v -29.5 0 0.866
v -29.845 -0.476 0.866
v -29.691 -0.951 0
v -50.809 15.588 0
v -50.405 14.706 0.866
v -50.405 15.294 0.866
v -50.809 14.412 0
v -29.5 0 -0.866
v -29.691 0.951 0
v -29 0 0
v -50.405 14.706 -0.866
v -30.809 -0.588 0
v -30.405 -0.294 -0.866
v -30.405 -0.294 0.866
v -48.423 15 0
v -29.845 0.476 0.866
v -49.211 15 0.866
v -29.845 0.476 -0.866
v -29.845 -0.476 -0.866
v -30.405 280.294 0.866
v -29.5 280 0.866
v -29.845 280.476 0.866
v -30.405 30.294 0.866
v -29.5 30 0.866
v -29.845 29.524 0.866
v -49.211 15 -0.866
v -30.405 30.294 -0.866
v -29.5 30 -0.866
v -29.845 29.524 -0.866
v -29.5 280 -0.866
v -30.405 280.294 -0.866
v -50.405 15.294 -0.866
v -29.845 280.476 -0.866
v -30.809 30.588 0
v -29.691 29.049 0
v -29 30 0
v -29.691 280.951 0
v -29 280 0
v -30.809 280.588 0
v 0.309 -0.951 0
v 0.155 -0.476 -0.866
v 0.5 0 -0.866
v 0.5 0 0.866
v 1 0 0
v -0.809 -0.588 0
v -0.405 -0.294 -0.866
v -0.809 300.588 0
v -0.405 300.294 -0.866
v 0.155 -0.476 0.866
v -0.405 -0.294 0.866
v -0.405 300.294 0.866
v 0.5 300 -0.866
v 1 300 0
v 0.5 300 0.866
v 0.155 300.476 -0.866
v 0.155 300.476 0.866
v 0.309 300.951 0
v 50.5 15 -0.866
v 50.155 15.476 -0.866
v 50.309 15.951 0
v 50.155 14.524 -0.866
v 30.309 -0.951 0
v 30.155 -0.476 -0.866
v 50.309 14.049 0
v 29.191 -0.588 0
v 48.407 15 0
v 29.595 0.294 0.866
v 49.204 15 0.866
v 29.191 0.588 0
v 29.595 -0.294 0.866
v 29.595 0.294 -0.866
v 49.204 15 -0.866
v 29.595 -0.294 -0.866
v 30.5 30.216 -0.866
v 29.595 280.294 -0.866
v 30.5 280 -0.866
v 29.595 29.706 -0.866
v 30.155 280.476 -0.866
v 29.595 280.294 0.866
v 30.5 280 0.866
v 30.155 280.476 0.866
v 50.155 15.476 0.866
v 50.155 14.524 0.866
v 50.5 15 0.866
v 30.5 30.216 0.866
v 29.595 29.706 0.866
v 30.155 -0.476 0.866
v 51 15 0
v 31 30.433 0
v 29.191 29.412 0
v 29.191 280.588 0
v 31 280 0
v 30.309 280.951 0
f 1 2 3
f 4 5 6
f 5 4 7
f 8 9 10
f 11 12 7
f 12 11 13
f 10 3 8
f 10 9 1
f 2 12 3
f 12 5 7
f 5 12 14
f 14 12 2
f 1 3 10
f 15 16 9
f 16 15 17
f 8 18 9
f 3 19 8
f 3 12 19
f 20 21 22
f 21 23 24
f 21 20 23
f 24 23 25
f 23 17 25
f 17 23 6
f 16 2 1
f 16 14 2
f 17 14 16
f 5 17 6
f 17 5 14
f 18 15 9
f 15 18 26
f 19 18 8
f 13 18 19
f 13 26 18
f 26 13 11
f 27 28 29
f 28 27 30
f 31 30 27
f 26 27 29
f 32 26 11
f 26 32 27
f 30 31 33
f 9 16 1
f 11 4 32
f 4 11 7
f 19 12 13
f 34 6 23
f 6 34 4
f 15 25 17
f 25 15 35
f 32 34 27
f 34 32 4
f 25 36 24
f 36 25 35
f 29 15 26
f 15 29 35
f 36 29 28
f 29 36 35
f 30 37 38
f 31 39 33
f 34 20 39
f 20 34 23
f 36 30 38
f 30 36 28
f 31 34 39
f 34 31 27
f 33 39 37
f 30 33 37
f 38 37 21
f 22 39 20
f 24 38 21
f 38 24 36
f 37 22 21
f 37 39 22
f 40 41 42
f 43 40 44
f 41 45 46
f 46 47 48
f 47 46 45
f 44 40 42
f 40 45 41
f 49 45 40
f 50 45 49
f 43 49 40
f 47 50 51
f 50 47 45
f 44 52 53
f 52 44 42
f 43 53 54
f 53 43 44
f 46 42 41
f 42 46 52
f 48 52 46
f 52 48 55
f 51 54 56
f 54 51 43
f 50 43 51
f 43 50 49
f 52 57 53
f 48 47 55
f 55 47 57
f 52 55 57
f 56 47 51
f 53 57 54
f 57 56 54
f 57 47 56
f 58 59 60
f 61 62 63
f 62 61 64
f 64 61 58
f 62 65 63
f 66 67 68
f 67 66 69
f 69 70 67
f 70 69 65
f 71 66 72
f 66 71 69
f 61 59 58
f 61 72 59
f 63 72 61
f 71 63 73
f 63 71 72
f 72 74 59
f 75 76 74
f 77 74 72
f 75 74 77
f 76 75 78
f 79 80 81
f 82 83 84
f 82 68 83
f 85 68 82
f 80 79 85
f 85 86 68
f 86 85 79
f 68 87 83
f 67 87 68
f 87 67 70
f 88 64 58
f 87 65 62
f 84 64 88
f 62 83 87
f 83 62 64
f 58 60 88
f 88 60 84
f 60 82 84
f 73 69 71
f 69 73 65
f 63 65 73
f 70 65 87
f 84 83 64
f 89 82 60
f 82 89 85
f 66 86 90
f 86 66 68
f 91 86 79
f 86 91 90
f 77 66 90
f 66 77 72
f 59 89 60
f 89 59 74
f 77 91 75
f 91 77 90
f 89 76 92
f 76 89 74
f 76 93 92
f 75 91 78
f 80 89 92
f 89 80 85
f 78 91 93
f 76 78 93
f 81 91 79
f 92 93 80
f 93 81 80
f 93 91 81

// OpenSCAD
distance_between_fixed_pulleys = 30;
distance_between_lines = 30;
control_length_left = 20 + 20*sin($t*360);
control_length_right = 20 + 20*sin($t*360*2);
L=300;


// Left line
hull()
{
translate([ -distance_between_lines,0,0]) sphere(r=1);
translate([ -control_length_left -distance_between_lines, distance_between_fixed_pulleys/2., 0]) sphere(r=1);
};
hull()
{
translate([ -control_length_left -distance_between_lines, distance_between_fixed_pulleys/2., 0]) sphere(r=1);
translate([ -distance_between_lines, distance_between_fixed_pulleys, 0]) sphere(r=1);
};
hull()
{
translate([ -distance_between_lines, distance_between_fixed_pulleys, 0]) sphere(r=1);
translate([ -distance_between_lines, distance_between_fixed_pulleys + 300 -2*sqrt(pow(distance_between_fixed_pulleys/2., 2)+ pow(control_length_left, 2)) , 0]) sphere(r=1);
};

// Central line
hull()
{
translate([ -0*distance_between_lines,0,0]) sphere(r=1);
translate([ -0*distance_between_lines, distance_between_fixed_pulleys, 0]) sphere(r=1);
};
hull()
{
translate([ -0*distance_between_lines, distance_between_fixed_pulleys, 0]) sphere(r=1);
translate([ -0*distance_between_lines, distance_between_fixed_pulleys + L -2*sqrt(pow(distance_between_fixed_pulleys/2., 2)) , 0]) sphere(r=1);
};

// Right line
hull()
{
translate([ distance_between_lines,0,0]) sphere(r=1);
translate([ control_length_right +distance_between_lines, distance_between_fixed_pulleys/2., 0]) sphere(r=1);
};
hull()
{
translate([ control_length_right +distance_between_lines, distance_between_fixed_pulleys/2., 0]) sphere(r=1);
translate([ distance_between_lines, distance_between_fixed_pulleys, 0]) sphere(r=1);
};
hull()
{
translate([ distance_between_lines, distance_between_fixed_pulleys, 0]) sphere(r=1);
translate([ distance_between_lines, distance_between_fixed_pulleys + 300 -2*sqrt(pow(distance_between_fixed_pulleys/2., 2)+ pow(control_length_right, 2)) , 0]) sphere(r=1);
};
